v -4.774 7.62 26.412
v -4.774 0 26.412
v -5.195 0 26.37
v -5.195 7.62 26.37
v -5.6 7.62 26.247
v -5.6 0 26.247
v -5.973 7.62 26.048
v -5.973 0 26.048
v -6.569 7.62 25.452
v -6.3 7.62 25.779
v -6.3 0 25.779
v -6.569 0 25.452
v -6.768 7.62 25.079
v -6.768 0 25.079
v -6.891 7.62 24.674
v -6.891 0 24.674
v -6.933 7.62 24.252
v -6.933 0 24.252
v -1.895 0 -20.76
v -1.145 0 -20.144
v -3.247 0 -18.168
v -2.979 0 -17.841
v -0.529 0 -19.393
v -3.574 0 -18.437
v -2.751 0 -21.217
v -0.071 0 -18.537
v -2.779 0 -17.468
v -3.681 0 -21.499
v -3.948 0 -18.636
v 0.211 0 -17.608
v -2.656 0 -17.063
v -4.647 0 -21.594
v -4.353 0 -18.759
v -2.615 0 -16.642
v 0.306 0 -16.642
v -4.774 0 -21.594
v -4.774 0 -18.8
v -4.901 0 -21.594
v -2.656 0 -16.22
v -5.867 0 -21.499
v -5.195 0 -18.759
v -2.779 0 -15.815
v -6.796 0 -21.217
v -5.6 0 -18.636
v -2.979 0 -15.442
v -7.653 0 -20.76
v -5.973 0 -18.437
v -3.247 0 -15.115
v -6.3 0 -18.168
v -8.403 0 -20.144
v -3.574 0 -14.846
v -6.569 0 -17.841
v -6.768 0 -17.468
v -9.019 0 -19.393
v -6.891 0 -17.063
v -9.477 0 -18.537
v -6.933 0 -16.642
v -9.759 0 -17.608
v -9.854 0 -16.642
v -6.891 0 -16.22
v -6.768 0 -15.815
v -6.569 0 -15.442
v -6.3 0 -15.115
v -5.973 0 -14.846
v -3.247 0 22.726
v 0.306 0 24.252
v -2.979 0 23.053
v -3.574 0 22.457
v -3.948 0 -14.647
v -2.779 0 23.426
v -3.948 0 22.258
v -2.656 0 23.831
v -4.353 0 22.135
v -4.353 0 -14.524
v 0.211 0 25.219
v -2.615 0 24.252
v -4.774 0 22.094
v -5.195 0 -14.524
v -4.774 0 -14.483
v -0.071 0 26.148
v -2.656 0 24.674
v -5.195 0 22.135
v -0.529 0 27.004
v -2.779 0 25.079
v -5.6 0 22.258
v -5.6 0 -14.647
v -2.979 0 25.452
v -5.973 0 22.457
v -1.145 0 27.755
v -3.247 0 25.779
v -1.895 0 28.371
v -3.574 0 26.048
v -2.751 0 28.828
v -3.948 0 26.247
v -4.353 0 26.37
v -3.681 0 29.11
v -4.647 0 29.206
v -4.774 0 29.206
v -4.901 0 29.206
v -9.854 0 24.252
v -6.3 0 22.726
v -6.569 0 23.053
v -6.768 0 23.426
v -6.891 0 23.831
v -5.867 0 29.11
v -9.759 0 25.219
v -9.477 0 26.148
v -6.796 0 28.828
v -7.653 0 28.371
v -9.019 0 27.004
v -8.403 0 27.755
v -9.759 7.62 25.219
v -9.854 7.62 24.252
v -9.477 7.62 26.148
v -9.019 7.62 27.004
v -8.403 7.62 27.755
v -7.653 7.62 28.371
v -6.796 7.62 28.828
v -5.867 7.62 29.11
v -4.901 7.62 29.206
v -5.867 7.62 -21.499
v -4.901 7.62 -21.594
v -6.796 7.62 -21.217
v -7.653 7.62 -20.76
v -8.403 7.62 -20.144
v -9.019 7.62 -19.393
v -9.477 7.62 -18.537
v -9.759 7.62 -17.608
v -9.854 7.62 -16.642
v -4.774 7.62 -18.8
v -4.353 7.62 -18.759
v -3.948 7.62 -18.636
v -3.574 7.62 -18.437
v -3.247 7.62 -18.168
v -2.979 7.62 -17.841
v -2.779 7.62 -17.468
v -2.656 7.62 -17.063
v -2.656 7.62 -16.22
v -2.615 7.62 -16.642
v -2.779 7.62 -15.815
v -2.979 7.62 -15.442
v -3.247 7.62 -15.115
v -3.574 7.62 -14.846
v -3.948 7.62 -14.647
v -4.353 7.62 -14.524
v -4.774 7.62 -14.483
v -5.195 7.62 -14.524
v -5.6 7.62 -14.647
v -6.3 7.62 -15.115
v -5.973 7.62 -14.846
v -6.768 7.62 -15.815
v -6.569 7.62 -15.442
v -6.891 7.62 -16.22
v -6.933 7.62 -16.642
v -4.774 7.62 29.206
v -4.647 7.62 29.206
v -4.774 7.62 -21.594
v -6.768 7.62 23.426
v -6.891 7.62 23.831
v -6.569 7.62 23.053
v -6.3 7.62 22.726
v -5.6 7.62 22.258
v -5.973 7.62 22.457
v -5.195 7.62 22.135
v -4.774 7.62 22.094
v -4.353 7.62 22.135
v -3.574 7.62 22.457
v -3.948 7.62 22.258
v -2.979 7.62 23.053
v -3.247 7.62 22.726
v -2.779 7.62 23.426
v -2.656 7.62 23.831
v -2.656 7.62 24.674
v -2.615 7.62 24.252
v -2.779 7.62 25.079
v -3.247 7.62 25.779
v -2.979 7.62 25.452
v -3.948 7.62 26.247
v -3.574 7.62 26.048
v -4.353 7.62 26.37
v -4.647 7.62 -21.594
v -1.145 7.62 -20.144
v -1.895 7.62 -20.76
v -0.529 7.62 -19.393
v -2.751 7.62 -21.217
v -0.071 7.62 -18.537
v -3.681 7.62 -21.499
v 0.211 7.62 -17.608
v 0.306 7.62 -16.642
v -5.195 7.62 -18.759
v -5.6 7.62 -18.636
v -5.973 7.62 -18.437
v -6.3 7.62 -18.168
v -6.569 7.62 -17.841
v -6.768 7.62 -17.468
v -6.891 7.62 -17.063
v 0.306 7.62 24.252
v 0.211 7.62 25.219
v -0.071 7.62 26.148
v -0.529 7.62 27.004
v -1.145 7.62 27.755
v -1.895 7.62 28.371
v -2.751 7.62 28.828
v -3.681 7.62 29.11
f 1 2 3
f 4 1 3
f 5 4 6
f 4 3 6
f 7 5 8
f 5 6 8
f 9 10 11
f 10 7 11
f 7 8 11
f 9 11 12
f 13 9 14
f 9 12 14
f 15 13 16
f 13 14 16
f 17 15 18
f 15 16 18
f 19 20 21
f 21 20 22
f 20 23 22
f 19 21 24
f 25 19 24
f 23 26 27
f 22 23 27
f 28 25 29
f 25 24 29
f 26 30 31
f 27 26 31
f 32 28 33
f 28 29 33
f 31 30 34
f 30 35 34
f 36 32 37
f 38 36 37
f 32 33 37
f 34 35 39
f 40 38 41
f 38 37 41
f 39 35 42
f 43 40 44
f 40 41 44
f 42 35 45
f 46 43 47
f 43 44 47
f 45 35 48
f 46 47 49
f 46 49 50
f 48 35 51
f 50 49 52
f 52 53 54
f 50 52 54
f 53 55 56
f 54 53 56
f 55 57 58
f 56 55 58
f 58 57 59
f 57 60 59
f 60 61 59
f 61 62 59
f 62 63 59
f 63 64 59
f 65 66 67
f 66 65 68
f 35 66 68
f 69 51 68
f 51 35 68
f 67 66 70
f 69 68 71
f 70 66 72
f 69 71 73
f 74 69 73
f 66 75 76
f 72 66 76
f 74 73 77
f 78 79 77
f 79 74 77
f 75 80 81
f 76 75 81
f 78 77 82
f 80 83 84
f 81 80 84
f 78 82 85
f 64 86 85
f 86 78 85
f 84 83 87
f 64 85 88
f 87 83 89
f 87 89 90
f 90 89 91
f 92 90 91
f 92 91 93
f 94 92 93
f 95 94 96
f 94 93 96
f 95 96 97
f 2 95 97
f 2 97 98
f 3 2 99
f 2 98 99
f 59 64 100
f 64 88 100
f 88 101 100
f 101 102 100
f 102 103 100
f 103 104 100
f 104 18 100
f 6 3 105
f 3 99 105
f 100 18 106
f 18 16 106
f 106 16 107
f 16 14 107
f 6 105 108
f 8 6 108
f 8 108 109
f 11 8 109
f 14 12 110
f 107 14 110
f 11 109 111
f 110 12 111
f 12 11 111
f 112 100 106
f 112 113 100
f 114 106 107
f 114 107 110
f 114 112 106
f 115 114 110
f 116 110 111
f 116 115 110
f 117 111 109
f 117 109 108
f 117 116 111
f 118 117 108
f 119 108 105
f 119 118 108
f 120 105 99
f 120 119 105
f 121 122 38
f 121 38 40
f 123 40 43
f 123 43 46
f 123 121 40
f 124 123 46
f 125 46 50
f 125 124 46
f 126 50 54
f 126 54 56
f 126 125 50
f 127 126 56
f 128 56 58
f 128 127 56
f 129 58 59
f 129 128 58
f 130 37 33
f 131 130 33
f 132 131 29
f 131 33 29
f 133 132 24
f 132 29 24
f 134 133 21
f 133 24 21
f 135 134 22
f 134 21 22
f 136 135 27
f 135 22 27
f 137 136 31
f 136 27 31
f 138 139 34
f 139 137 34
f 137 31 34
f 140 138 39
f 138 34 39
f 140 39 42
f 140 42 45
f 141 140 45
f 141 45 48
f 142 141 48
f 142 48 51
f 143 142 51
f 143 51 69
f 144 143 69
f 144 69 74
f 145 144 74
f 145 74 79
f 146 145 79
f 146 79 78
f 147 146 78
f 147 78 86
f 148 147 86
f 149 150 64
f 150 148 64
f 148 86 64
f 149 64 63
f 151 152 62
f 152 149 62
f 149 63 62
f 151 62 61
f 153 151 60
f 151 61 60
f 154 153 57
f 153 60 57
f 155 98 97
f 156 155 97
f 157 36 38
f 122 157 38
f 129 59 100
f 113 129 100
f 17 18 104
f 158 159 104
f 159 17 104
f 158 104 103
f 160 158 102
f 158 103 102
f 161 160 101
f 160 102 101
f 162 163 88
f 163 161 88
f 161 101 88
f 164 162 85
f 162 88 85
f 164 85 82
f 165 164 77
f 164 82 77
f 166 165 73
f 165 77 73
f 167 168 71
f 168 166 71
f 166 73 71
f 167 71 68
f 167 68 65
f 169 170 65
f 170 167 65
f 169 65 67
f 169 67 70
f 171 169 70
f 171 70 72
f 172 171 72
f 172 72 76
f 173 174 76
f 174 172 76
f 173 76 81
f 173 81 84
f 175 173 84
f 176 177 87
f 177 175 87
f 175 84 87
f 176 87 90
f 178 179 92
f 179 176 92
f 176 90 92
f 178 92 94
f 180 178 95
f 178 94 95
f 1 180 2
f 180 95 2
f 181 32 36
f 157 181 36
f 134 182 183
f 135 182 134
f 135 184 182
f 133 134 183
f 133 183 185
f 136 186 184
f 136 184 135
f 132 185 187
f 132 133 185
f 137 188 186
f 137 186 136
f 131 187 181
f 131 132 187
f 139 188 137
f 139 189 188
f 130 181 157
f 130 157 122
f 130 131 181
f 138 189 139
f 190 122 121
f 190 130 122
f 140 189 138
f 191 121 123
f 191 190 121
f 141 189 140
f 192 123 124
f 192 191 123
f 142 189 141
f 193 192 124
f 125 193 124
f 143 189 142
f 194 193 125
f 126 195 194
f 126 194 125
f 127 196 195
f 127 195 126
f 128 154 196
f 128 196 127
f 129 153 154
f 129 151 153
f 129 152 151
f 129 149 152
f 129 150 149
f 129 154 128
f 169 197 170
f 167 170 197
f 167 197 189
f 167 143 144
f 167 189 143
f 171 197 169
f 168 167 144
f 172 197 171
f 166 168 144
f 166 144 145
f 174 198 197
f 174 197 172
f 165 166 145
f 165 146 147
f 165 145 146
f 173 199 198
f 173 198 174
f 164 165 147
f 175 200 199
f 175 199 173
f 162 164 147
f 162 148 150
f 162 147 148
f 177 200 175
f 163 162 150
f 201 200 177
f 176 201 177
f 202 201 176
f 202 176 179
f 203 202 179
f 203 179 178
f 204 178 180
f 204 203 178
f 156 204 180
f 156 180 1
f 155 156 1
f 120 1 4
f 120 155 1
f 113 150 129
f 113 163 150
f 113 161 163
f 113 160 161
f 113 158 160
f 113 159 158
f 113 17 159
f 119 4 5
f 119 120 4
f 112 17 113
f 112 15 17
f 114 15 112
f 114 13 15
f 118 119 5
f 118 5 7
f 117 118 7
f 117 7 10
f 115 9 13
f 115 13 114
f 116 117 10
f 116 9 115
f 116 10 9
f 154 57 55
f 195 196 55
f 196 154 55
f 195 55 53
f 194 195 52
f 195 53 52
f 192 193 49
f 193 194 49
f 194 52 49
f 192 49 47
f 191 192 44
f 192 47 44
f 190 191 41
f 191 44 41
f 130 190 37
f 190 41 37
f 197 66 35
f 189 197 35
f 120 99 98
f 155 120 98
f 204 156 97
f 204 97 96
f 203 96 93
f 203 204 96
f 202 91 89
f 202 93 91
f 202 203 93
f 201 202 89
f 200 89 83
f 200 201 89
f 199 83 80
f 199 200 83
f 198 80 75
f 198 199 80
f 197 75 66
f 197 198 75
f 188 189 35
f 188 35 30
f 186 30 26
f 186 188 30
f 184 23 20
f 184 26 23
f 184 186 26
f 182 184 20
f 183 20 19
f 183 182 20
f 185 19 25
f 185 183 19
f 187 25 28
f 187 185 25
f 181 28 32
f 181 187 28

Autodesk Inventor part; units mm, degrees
ref_plane "YZ Plane" through (0, 0, 0) normal (1, 0, 0) x (0, 1, 0)
ref_plane "XZ Plane" through (0, 0, 0) normal (0, 1, 0) x (-1, 0, 0)
ref_plane "XY Plane" through (0, 0, 0) normal (0, 0, 1) x (1, 0, 0)
sketch "Sketch1" plane through (0, 0, 0) normal (0, 1, 0) x (-1, 0, 0)
  line L0 (9.8538, 29.2055) -> (-0.3062, 29.2055)
  line L1 (-0.3062, 29.2055) -> (-0.3062, -21.5945)
  line L2 (-0.3062, -21.5945) -> (9.8538, -21.5945)
  line L3 (9.8538, -21.5945) -> (9.8538, 29.2055)
  line L4 (4.7738, -21.5945) -> (4.7738, -16.6415)
  line L5 (4.7738, 29.2055) -> (4.7738, 24.2525)
  circle A0 centre (4.7738, 24.2525) radius 2.159
  circle A1 centre (4.7738, -16.6415) radius 2.159
  point P0 (0, 0)
  dimension "d0" = 10.16
  dimension "d1" = 50.8
  dimension "d2" = 4.953
  dimension "d3" = 4.953
  dimension "d4" = 4.318
  dimension "d5" = 4.318
extrude "Extrusion1" add sketch "Sketch1" along normal blind 7.62
fillet "Fillet1" radius 4.953 1 edges at (0.3062, 3.81, -21.5945)
fillet "Fillet2" radius 4.953 3 edges at (-9.8538, 3.81, -21.5945) (0.3062, 3.81, 29.2055) (-9.8538, 3.81, 29.2055)
properties part number "Hand4"
